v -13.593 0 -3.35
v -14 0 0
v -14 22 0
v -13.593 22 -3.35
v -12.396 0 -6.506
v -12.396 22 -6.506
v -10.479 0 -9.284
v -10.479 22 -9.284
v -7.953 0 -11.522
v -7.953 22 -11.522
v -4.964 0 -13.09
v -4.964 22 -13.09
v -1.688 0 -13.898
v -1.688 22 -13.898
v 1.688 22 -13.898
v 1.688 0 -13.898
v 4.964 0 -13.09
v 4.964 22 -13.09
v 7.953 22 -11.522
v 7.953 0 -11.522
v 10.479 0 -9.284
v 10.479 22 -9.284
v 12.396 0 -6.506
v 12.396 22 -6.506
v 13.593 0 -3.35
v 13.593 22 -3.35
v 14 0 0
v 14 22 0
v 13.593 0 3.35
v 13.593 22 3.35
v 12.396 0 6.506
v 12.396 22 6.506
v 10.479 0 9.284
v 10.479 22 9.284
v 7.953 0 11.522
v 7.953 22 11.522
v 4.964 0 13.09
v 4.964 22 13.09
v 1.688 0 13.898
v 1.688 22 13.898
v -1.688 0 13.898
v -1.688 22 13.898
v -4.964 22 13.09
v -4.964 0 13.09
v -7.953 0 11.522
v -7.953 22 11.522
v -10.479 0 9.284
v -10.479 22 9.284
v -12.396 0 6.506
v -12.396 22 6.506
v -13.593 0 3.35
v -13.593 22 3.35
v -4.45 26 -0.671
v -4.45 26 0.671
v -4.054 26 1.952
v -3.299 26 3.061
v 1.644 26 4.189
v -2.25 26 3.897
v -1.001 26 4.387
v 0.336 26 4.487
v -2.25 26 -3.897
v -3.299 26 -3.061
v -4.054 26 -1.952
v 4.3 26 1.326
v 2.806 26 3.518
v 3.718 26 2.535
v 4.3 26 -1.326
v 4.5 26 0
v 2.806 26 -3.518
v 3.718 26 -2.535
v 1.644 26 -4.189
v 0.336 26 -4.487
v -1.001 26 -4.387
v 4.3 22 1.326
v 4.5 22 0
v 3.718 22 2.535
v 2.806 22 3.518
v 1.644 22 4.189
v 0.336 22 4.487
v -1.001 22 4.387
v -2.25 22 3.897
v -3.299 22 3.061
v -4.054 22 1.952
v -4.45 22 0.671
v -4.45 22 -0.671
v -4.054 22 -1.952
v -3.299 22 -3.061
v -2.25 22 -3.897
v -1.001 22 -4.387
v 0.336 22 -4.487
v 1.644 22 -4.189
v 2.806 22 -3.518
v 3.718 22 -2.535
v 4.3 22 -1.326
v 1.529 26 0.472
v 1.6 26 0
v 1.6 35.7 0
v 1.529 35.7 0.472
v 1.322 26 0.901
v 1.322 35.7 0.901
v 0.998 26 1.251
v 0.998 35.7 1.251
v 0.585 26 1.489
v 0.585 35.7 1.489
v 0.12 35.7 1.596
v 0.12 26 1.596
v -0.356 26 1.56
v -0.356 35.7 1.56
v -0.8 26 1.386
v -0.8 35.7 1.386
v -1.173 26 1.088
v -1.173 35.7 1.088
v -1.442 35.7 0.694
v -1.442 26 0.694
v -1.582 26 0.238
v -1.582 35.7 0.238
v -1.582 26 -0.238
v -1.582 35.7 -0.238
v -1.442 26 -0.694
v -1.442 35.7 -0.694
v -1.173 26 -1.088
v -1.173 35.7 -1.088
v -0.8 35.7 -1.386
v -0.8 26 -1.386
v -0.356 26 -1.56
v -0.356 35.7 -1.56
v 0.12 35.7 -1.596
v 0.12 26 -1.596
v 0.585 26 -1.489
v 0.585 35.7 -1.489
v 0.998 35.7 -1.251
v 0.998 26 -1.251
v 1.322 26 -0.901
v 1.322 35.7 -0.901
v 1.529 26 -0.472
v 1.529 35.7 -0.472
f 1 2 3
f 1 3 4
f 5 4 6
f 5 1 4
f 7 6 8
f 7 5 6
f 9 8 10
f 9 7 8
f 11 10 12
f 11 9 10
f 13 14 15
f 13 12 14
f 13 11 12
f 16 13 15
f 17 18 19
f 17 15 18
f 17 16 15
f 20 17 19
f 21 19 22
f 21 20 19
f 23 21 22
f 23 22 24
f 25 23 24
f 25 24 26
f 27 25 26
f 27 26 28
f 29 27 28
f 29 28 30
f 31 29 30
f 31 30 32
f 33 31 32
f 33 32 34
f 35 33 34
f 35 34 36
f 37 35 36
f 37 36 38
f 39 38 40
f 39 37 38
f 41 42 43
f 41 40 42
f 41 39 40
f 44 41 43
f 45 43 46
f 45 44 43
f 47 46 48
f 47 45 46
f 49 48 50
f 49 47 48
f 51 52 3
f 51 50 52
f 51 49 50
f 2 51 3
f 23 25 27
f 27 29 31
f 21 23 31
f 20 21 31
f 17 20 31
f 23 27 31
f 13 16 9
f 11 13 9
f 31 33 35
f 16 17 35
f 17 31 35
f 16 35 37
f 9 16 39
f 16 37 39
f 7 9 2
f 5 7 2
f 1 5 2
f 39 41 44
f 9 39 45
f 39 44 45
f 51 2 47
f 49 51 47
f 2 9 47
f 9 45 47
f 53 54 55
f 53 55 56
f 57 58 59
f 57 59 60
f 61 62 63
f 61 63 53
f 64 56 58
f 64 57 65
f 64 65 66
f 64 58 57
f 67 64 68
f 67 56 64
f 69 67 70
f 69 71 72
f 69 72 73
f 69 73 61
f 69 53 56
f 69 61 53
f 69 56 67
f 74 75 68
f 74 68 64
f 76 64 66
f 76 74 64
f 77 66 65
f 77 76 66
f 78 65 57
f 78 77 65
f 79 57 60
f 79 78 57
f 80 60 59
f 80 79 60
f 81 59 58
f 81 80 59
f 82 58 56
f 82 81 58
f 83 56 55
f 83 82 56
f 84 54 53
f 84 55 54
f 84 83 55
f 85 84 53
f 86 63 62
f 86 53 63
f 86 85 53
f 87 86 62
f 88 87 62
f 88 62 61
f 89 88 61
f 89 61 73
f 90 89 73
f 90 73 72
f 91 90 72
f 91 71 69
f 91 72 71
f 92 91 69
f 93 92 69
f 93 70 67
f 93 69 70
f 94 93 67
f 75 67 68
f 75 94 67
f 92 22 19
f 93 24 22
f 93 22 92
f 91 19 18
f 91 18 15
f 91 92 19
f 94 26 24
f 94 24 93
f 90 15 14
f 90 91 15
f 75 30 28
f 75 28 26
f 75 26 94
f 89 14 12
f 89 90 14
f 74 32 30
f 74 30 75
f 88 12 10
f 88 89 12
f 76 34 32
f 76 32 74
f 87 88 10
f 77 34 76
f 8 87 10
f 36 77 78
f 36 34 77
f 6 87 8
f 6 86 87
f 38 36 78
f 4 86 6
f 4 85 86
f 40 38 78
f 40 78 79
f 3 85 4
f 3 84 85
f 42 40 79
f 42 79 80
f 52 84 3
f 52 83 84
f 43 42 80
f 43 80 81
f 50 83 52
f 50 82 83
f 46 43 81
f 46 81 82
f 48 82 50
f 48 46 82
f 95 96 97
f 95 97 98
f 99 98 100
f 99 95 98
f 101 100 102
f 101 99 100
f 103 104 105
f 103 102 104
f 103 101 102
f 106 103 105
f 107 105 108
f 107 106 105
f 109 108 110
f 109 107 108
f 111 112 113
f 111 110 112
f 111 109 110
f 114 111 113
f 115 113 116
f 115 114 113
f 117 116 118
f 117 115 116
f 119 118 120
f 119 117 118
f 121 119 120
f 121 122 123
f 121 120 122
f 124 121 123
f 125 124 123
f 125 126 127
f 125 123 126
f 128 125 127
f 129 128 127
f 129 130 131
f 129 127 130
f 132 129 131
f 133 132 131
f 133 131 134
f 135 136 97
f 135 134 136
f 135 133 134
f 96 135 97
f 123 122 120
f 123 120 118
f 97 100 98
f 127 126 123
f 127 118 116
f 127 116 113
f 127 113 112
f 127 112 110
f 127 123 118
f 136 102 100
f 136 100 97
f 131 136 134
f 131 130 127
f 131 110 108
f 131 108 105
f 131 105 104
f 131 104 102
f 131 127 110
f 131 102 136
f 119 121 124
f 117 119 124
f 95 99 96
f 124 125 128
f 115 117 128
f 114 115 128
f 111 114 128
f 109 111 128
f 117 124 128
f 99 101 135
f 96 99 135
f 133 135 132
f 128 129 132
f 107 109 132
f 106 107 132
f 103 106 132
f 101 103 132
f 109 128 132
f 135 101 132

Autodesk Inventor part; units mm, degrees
ref_plane "YZ Plane" through (0, 0, 0) normal (1, 0, 0) x (0, 1, 0)
ref_plane "XZ Plane" through (0, 0, 0) normal (0, 1, 0) x (-1, 0, 0)
ref_plane "XY Plane" through (0, 0, 0) normal (0, 0, 1) x (1, 0, 0)
sketch "Sketch1" plane through (0, 0, 0) normal (0, 1, 0) x (-1, 0, 0)
  circle A0 centre (0, 0) radius 14
  dimension "d0" = 28
extrude "Extrusion1" add sketch "Sketch1" along normal blind 22
sketch "Sketch2" plane through (0, 22, 0) normal (0, 1, 0) x (1, 0, 0)
  circle A0 centre (0, 0) radius 4.5
  dimension "d3" = 9
extrude "Extrusion2" add sketch "Sketch2" along normal blind 4
sketch "Sketch3" plane through (0, 26, 0) normal (0, 1, 0) x (1, 0, 0)
  circle A0 centre (0, 0) radius 1.6
  dimension "d6" = 3.2
extrude "Extrusion3" add sketch "Sketch3" along normal blind 9.7 separate body
properties part number "Brushless 2622 2600KV"
